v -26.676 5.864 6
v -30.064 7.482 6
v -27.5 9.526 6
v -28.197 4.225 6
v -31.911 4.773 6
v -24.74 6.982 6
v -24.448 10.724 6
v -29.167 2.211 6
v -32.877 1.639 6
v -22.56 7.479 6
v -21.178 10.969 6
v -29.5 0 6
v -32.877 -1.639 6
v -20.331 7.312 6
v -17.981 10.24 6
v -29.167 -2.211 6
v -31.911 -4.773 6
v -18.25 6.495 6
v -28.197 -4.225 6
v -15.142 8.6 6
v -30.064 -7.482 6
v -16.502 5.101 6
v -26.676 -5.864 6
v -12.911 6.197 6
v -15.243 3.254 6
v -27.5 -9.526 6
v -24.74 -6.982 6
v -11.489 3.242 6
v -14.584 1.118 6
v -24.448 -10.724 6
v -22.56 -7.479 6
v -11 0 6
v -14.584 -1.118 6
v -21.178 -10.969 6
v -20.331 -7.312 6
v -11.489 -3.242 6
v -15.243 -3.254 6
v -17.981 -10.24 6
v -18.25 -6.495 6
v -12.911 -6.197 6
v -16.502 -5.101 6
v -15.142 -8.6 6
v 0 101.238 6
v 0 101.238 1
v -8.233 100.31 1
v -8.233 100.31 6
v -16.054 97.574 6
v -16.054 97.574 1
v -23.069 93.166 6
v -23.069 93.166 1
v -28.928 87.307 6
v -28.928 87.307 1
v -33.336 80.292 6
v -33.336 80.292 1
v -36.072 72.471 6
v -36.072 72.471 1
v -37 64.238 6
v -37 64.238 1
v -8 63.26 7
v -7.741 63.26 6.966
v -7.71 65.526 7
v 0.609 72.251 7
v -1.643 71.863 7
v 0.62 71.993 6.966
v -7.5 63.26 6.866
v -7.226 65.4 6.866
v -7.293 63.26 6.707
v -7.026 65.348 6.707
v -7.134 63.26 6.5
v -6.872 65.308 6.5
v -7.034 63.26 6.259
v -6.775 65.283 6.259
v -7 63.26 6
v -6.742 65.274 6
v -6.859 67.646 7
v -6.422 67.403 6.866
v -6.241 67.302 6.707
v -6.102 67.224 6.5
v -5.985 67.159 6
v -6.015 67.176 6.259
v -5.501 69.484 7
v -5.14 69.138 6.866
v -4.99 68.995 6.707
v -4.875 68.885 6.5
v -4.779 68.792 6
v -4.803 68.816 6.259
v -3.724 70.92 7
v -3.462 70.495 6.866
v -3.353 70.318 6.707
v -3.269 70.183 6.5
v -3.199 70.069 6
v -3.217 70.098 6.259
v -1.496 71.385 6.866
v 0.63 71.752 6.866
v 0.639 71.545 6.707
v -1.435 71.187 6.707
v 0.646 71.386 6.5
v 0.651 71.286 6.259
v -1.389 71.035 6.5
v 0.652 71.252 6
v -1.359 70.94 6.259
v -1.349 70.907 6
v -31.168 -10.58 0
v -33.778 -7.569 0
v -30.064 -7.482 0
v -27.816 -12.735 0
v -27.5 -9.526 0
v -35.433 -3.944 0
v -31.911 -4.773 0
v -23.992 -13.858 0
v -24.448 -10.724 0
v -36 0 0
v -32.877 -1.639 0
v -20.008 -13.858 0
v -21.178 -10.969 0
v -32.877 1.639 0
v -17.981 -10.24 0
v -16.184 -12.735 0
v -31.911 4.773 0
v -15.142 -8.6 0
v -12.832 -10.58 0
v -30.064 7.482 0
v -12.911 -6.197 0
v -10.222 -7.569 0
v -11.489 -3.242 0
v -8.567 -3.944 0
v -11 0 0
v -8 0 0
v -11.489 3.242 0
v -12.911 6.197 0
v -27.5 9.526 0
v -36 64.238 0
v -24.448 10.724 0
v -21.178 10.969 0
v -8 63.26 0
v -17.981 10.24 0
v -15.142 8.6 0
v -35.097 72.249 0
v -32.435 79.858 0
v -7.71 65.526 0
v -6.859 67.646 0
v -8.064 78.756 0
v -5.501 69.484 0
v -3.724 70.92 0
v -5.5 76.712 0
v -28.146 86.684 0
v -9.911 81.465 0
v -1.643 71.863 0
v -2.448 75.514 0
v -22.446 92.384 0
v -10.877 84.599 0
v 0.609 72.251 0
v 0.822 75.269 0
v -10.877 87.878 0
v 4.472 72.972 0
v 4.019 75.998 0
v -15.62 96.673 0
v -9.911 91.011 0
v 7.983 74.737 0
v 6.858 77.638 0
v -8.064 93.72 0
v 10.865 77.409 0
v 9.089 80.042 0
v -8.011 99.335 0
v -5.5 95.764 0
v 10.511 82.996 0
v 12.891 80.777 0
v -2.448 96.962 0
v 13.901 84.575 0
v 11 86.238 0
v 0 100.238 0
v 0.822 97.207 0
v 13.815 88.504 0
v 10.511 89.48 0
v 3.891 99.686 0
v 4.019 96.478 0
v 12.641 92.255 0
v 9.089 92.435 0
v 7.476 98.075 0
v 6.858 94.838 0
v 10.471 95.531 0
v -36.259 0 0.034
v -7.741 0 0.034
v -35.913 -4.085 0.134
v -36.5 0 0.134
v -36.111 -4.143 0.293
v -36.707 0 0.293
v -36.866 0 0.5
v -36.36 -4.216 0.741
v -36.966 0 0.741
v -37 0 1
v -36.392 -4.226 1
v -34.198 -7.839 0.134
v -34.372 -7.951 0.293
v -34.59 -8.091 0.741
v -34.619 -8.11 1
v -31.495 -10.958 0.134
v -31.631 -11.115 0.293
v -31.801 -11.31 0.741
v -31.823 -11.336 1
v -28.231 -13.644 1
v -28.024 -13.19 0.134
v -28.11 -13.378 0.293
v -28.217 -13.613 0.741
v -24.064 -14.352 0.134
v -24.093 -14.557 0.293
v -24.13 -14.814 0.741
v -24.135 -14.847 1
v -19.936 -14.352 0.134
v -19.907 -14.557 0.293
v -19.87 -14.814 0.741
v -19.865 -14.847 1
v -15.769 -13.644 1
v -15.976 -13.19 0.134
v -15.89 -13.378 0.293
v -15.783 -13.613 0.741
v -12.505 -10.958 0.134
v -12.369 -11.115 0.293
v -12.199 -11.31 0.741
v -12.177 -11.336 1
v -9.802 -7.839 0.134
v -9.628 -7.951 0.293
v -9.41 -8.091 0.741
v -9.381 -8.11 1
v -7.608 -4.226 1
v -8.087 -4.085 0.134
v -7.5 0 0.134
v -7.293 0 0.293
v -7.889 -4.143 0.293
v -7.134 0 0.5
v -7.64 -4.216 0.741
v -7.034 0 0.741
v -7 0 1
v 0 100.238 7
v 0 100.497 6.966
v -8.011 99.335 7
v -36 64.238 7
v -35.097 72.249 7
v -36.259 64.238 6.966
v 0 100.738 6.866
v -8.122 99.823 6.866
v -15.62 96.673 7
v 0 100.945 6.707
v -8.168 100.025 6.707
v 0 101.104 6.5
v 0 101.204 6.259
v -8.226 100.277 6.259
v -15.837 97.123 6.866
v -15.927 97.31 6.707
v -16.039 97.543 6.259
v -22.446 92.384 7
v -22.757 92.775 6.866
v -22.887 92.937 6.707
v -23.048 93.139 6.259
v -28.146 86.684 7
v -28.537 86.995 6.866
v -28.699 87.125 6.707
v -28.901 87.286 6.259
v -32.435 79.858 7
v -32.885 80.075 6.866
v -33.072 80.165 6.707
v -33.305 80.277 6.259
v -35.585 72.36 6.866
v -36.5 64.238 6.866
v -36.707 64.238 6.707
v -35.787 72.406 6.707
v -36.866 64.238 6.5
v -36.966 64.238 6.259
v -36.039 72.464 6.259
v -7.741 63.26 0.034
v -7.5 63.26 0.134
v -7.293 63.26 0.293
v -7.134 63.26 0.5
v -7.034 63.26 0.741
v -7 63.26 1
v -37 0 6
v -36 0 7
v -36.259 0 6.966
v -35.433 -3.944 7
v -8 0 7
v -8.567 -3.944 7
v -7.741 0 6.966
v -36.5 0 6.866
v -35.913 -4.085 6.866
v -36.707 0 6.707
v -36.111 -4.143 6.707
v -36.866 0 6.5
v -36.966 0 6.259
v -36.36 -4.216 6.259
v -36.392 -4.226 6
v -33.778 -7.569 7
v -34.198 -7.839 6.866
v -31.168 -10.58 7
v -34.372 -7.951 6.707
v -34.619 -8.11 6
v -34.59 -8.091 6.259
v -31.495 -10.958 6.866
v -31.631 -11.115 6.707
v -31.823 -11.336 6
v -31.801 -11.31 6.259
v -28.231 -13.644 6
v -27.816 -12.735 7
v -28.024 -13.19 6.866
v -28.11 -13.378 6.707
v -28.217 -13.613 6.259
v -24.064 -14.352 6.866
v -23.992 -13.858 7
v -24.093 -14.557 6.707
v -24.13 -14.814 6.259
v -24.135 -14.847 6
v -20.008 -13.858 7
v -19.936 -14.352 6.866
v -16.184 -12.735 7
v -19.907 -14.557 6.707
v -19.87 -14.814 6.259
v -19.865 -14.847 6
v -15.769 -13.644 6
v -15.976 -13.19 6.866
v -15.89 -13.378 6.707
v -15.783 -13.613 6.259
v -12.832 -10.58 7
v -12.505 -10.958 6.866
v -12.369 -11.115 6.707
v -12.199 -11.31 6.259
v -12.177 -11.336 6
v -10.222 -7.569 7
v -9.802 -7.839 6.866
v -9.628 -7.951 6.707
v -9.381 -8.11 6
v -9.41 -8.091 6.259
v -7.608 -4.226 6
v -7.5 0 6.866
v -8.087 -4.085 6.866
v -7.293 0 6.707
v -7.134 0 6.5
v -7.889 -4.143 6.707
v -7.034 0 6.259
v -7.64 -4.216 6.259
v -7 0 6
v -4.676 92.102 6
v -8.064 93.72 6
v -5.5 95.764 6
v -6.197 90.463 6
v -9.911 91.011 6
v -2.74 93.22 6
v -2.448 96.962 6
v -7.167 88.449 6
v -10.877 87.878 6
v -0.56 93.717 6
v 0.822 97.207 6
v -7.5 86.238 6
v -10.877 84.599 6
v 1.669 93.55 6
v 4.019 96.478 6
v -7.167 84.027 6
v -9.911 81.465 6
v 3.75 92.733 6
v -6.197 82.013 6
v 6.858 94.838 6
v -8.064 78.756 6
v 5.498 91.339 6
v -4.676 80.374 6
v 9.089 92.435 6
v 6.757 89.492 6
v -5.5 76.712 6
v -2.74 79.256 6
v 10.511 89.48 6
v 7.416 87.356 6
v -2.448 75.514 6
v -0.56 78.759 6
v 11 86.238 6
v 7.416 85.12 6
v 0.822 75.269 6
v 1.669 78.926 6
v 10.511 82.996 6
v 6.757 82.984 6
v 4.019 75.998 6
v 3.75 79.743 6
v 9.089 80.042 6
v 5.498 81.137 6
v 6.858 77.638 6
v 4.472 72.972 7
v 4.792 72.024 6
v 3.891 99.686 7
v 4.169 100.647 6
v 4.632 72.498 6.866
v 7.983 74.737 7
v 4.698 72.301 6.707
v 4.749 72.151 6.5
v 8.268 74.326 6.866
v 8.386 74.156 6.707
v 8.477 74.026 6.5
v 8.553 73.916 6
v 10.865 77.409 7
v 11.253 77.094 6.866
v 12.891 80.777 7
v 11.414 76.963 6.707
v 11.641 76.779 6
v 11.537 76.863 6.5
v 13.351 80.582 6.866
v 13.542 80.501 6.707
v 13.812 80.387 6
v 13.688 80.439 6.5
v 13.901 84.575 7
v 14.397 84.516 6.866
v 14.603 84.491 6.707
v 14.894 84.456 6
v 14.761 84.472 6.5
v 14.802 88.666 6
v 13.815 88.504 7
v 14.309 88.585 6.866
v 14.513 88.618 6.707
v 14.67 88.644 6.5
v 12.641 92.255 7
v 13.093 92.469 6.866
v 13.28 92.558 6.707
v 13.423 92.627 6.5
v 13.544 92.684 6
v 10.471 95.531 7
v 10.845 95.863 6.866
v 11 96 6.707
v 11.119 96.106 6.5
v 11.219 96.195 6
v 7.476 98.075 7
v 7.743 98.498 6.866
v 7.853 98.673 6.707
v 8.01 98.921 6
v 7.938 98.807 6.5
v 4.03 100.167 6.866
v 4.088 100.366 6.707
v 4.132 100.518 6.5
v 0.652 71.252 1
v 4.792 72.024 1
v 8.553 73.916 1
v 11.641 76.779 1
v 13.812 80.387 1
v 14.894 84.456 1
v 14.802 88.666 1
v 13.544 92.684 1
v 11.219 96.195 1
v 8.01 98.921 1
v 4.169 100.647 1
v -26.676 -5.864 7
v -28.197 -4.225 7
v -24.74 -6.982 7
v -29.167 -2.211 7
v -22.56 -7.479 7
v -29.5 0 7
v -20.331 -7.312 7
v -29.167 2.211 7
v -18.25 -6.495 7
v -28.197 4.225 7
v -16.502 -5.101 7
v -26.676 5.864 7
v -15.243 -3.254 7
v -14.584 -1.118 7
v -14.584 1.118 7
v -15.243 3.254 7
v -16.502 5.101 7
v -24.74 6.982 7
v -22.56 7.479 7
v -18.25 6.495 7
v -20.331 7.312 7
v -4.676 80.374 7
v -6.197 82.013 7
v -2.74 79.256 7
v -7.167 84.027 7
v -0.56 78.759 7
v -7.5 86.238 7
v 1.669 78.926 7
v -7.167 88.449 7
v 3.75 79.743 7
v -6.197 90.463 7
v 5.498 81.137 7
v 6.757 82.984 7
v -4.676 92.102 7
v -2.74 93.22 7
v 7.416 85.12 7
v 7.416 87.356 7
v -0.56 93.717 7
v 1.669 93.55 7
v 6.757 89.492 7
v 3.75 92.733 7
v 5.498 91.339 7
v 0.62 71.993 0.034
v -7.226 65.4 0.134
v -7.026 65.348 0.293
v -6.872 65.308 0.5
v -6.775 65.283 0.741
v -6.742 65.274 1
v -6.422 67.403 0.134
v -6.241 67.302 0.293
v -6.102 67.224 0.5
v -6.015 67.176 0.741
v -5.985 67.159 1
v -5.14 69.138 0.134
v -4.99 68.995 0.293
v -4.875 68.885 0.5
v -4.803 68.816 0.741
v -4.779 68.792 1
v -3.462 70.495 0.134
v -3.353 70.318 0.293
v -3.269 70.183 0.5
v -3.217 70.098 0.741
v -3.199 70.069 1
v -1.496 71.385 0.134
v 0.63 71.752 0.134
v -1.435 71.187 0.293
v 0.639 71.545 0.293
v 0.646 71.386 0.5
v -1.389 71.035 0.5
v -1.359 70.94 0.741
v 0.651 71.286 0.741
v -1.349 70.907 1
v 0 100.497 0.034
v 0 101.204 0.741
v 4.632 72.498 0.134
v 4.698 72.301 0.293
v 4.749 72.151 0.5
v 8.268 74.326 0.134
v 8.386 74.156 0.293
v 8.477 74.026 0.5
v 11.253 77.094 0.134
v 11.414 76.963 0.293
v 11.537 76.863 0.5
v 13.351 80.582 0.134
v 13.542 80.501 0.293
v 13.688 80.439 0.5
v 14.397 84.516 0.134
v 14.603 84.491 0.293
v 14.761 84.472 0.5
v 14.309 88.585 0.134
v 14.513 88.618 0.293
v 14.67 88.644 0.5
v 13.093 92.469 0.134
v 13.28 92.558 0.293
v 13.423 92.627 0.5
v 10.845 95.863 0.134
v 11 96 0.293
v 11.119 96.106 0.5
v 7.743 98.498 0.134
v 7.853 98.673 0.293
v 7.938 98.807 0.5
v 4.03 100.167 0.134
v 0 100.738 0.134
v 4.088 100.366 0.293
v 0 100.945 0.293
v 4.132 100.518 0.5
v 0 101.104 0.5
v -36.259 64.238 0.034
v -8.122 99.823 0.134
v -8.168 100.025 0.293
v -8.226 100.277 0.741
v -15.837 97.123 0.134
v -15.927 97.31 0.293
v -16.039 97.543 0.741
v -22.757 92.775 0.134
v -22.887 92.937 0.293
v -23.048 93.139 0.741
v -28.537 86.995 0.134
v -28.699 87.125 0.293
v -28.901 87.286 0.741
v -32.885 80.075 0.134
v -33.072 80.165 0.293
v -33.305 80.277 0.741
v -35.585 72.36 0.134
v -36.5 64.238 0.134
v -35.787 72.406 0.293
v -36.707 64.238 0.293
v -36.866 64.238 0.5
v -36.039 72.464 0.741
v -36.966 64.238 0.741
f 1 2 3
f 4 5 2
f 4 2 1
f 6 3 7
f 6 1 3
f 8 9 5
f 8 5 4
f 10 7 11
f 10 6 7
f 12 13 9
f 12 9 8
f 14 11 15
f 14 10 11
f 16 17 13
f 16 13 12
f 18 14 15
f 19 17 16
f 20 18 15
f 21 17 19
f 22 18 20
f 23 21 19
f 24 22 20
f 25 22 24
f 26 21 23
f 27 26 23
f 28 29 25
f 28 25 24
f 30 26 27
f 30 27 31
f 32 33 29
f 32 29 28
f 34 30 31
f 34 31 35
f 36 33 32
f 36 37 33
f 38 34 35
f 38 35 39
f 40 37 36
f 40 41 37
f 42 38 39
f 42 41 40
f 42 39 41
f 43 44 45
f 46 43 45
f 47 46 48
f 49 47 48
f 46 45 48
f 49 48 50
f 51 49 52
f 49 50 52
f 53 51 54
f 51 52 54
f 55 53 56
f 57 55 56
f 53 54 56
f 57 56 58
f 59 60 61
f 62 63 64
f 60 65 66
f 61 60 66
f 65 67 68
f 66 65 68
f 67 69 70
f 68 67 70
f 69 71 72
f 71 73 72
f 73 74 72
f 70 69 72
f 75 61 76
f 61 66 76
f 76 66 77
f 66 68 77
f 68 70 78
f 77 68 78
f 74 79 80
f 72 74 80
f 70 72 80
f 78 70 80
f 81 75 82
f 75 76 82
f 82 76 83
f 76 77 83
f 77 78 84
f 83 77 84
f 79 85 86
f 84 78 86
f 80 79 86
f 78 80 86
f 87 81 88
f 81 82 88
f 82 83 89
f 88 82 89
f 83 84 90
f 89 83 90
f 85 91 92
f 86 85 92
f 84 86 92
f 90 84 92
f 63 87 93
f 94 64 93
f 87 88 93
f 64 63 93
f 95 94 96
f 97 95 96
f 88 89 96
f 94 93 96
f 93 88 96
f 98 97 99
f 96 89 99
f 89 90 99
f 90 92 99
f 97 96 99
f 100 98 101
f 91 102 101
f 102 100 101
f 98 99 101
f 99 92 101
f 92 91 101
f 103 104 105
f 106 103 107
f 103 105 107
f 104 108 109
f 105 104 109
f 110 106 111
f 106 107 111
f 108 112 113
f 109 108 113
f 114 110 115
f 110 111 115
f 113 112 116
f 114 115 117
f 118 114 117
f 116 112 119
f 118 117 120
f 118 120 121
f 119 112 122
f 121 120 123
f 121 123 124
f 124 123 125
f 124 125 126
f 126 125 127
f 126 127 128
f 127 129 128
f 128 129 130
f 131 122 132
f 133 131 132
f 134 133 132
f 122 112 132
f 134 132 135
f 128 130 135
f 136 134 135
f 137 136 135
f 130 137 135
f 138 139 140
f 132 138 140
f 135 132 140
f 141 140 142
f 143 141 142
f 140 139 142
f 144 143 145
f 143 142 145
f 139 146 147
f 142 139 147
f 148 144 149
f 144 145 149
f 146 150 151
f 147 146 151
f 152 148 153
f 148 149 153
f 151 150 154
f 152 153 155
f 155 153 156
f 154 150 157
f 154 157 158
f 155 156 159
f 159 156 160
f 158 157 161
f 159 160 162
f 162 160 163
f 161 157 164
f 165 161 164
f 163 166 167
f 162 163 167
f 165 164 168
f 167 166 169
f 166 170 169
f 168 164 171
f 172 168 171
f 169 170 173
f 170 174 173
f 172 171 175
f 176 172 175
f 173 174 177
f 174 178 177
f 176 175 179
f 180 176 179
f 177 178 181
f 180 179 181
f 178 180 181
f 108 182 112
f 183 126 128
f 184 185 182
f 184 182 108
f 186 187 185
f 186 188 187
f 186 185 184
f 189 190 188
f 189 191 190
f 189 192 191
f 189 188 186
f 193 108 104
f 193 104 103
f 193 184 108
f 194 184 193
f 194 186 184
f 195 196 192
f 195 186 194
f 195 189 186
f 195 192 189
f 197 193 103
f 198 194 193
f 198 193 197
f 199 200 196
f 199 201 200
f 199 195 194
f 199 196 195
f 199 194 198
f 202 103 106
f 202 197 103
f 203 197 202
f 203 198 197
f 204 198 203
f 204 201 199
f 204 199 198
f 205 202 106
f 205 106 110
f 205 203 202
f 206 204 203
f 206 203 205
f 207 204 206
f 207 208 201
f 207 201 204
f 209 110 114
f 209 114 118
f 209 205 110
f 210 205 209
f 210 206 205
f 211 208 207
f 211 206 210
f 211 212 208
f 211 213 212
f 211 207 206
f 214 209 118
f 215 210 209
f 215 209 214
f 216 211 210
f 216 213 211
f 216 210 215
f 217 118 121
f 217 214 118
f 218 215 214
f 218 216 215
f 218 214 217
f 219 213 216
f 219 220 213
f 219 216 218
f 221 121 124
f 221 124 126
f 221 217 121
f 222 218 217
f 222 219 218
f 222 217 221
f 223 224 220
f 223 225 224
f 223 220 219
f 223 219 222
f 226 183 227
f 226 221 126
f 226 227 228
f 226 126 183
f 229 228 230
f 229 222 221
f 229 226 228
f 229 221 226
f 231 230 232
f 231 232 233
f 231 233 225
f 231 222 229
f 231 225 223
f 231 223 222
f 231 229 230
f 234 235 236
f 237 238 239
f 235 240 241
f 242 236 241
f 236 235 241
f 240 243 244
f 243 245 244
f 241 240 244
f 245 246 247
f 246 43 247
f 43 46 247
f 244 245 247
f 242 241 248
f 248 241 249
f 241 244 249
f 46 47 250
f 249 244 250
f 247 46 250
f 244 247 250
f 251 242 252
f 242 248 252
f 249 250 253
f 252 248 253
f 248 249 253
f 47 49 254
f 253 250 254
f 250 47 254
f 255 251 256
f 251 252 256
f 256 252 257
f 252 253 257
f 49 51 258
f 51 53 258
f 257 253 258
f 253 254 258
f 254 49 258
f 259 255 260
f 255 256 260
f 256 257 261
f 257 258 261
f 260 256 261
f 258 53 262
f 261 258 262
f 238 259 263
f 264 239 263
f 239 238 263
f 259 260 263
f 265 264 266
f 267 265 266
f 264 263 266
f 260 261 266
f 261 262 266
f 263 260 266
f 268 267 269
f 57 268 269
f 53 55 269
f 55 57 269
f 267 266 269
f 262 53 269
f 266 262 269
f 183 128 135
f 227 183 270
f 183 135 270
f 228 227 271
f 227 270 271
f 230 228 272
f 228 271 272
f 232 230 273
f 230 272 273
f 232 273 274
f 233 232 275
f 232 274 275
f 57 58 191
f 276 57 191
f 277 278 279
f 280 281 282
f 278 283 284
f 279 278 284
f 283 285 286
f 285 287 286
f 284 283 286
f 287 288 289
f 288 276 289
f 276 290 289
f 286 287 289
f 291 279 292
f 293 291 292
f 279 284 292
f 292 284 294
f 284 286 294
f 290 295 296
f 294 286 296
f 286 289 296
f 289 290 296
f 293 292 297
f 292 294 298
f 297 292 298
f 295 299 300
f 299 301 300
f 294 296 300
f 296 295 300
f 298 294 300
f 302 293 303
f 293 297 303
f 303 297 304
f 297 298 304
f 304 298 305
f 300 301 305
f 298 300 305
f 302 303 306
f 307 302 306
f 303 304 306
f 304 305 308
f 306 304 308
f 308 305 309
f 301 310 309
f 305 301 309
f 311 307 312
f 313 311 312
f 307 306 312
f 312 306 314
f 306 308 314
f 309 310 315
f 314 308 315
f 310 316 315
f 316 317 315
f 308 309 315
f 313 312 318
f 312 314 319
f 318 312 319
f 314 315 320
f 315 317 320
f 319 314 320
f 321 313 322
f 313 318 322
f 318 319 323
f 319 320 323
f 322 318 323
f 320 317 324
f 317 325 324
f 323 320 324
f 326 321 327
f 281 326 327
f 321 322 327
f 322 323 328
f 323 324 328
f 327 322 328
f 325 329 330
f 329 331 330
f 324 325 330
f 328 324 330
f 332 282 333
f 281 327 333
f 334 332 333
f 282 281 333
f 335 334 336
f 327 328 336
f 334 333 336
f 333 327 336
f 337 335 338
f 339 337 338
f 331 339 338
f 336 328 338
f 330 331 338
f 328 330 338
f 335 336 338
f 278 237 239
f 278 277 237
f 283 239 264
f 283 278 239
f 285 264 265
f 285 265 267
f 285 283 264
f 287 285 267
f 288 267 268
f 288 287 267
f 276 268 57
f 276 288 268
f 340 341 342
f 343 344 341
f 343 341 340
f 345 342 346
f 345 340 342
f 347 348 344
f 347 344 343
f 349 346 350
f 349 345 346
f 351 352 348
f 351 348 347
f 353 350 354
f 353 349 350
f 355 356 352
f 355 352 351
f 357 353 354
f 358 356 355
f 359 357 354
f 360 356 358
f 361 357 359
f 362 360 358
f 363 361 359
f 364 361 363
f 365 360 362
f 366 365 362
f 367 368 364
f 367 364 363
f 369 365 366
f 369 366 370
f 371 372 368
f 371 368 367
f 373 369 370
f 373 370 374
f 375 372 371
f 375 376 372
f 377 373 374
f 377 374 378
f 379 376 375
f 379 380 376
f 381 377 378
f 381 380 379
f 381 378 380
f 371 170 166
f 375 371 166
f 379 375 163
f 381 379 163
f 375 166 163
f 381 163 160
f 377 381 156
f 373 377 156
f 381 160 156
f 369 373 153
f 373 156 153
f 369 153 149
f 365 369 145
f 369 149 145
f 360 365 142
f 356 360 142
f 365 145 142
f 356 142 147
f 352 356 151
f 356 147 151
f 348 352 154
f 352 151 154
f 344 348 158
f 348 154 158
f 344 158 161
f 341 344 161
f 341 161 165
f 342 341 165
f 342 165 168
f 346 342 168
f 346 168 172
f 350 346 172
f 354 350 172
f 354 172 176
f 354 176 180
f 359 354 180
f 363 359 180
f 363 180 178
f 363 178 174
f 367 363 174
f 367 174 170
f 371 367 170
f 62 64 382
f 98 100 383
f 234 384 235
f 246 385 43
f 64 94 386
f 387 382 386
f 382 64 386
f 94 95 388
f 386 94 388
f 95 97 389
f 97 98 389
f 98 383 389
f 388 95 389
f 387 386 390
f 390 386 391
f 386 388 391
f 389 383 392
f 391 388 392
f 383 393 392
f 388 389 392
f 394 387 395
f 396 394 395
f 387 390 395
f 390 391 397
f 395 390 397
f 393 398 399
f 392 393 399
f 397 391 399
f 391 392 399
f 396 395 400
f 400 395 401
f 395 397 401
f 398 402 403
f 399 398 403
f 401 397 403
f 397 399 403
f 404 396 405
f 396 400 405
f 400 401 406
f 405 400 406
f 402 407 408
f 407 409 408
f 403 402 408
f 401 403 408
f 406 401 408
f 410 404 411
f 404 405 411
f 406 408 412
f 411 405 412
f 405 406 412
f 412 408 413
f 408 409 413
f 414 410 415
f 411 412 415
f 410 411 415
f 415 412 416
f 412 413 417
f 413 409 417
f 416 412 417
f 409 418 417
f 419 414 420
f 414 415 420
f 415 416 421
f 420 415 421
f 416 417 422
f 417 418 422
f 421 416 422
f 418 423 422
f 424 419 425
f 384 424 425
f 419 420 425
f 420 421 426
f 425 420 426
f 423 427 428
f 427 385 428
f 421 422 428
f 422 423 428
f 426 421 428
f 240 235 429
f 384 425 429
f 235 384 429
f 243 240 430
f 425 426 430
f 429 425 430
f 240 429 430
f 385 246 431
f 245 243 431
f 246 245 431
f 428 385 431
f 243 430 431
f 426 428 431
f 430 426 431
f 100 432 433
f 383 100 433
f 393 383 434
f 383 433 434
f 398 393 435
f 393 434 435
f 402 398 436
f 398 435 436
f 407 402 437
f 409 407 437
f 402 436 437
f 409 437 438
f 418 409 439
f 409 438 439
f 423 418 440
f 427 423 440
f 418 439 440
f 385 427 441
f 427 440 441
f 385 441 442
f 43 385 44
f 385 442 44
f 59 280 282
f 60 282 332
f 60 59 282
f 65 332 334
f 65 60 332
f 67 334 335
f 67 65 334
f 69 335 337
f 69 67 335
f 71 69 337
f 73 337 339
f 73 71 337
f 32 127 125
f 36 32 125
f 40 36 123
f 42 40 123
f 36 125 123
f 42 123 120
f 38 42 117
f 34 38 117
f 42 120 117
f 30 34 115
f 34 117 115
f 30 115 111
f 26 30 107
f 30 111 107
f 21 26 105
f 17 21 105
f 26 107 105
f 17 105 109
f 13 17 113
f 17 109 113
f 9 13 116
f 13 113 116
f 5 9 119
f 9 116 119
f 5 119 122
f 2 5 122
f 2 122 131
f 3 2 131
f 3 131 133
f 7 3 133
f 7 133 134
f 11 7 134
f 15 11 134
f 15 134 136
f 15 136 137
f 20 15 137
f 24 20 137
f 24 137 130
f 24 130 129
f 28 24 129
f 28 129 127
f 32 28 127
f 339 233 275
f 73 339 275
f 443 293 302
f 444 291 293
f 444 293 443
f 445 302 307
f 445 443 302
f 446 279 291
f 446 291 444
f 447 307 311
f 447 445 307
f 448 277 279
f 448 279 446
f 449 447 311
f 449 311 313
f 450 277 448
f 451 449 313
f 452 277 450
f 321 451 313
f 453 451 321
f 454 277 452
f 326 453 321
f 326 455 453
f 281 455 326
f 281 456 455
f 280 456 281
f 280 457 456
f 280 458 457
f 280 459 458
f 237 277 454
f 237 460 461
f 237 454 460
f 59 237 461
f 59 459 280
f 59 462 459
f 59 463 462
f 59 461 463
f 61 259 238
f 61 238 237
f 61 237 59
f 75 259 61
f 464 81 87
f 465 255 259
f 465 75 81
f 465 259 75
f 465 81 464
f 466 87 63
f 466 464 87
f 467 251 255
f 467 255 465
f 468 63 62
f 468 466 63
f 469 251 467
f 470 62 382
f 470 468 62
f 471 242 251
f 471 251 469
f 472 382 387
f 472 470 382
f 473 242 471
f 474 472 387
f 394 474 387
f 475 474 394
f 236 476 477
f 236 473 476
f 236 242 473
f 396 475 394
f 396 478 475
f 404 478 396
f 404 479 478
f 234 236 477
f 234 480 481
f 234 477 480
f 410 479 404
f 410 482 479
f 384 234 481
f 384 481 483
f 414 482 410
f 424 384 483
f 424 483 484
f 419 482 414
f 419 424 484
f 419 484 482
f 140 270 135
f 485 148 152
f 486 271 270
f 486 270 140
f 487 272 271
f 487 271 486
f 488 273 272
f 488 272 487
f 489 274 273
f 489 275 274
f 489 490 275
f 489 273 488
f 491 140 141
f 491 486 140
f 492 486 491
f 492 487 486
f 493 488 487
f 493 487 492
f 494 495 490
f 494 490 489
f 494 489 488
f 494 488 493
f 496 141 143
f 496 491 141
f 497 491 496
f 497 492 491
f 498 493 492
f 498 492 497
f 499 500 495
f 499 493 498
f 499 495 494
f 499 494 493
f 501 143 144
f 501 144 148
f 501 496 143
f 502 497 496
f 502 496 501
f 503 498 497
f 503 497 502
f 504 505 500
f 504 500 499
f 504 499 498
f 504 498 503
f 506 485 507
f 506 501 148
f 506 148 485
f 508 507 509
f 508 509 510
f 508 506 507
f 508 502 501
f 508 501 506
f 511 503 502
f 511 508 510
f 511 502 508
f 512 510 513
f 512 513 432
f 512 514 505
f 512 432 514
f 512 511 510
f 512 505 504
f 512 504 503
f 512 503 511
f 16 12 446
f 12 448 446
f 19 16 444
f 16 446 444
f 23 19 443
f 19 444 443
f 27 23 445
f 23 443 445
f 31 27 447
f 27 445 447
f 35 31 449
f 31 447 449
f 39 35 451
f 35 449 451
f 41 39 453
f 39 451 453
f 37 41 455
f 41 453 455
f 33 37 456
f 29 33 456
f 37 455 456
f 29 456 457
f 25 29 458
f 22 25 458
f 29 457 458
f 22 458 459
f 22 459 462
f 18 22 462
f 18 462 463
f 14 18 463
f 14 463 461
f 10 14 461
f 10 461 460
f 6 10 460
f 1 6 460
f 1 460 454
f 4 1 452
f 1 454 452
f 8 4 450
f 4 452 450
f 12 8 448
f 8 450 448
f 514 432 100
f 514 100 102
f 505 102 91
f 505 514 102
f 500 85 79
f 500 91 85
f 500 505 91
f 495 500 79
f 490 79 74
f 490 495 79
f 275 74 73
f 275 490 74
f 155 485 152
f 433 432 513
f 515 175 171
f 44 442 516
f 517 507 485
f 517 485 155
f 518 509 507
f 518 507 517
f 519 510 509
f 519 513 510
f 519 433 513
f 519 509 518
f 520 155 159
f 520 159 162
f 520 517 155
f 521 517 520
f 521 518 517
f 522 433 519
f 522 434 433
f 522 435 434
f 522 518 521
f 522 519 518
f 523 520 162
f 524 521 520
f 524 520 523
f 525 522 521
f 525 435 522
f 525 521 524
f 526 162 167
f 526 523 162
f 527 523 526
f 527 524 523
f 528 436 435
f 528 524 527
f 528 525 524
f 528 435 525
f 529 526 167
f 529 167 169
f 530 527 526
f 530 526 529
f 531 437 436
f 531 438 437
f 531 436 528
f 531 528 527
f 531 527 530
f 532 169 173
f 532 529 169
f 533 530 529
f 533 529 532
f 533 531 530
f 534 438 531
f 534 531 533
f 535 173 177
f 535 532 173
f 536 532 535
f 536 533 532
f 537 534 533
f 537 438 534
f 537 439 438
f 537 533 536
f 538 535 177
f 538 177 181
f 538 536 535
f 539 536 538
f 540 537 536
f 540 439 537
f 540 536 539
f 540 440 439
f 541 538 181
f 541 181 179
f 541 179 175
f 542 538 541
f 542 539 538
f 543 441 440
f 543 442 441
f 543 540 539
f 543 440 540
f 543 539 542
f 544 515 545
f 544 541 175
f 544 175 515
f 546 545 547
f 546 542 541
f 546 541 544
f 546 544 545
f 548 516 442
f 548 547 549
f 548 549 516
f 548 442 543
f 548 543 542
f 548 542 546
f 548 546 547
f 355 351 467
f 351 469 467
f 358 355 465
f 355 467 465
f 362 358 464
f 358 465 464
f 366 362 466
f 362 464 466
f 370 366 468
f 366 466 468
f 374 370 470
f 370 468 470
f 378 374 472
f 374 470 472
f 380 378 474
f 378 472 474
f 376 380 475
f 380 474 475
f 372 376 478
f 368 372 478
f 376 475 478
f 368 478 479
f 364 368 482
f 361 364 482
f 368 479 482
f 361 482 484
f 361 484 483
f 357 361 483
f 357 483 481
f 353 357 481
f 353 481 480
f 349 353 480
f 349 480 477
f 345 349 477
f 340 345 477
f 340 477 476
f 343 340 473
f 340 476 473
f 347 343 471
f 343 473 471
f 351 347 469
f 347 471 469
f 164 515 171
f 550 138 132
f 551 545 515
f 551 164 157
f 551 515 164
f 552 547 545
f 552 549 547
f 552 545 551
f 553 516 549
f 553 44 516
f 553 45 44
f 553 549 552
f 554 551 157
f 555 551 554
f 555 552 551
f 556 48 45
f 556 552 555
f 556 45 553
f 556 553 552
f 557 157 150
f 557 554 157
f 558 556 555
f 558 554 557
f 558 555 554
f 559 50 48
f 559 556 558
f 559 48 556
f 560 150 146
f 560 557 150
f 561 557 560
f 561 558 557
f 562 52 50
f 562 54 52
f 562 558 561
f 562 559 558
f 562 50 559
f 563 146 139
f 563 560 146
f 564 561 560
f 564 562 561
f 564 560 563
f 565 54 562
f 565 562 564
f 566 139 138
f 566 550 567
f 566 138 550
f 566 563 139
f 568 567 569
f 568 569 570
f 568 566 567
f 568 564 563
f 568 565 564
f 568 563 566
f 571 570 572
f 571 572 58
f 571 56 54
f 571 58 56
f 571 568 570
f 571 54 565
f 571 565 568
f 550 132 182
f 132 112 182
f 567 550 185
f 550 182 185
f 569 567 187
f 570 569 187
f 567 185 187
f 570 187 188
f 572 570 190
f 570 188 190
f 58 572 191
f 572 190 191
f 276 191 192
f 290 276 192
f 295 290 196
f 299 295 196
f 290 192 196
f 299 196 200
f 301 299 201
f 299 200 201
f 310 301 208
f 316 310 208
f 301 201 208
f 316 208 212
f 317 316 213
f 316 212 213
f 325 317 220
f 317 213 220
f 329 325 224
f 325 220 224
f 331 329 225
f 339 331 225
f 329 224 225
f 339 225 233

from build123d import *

# Parameters (mm, degrees)
PAD_DEPTH        = 7
HOLE_D           = 15
HOLE_CBORE_D     = 22
HOLE_CBORE_DEPTH = 6
FILLET_R         = 1


with BuildPart() as part:
    # Sketch002 → Pad (new body)
    with BuildSketch(Plane.XY):
        with BuildLine():
            ThreePointArc((0.652174, 71.252227), (14.996453, 86.564207), (0, 101.238043))
            ThreePointArc((0, 101.238043), (-26.162951, 90.400994), (-37, 64.238043))
            Line((-37, 64.238043), (-37, 0))
            ThreePointArc((-37, 0), (-22, -15), (-7, 0))
            Line((-7, 0), (-7, 63.259792))
            ThreePointArc((0.652174, 71.252227), (-4.778521, 68.792305), (-7, 63.259792))
        make_face()
    extrude(amount=PAD_DEPTH)

    # Hole (through all)
    with Locations(Plane(origin=(0, 0, 0), x_dir=(1, 0, 0), z_dir=(0, 0, -1))):
        with Locations((0, -86.238043), (-22, 0)):
            CounterBoreHole(HOLE_D / 2, HOLE_CBORE_D / 2, HOLE_CBORE_DEPTH)

    # Fillet
    fillet_edges = [part.edges().sort_by_distance(p)[0] for p in [
        (-37, 32.119021, 0),
        (-37, 32.119021, 7),
    ]]
    fillet(fillet_edges, radius=FILLET_R)


solid = part.part
